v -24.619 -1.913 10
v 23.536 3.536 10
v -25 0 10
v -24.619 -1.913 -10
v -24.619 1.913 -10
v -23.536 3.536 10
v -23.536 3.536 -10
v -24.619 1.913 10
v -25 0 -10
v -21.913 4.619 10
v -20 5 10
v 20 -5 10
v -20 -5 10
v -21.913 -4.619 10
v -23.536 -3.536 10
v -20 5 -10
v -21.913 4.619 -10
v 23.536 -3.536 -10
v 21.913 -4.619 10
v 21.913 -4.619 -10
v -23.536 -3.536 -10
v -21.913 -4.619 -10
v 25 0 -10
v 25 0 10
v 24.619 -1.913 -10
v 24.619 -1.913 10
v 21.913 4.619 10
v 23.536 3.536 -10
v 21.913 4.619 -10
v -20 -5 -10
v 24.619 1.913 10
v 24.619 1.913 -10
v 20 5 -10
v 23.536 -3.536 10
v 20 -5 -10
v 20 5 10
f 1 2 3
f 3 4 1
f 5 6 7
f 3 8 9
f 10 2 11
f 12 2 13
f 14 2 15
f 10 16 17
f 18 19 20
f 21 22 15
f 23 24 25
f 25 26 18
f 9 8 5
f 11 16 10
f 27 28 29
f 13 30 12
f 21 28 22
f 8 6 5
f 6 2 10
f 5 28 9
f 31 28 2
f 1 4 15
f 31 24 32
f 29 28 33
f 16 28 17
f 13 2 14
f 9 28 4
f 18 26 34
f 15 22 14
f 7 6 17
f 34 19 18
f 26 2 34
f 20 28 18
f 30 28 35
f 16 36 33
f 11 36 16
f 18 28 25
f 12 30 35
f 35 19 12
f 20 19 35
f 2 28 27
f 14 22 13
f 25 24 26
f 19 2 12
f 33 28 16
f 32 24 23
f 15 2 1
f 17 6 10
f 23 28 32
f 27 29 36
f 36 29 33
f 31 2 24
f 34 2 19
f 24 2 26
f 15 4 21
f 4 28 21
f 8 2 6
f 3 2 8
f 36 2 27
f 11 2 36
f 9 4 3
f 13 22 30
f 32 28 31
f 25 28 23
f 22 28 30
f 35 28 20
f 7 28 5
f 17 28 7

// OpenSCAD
/* +-------------------------------------------+
 * | Tiles the medibot can travel on. |
 * +-------------------------------------------+
 */
 
 /*
  * Tenon will allow tiles to fit together. See https://en.wikipedia.org/wiki/Mortise_and_tenon
  */
module tenon(width, height, depth) {
    radius = height/2;
    hull() {
        translate([-width/2 + radius, 0, 0]) cylinder(h=depth, r=radius, center=true);
        translate([ width/2 - radius, 0, 0]) cylinder(h=depth, r=radius, center=true);
    }
}
 
 /*
  * Base provides an easily assembled part so tiles can fit together.
  */
module base(size=100, height=10) {
    cube([size, size, height]);
}

tenon(50, 10, 20);
